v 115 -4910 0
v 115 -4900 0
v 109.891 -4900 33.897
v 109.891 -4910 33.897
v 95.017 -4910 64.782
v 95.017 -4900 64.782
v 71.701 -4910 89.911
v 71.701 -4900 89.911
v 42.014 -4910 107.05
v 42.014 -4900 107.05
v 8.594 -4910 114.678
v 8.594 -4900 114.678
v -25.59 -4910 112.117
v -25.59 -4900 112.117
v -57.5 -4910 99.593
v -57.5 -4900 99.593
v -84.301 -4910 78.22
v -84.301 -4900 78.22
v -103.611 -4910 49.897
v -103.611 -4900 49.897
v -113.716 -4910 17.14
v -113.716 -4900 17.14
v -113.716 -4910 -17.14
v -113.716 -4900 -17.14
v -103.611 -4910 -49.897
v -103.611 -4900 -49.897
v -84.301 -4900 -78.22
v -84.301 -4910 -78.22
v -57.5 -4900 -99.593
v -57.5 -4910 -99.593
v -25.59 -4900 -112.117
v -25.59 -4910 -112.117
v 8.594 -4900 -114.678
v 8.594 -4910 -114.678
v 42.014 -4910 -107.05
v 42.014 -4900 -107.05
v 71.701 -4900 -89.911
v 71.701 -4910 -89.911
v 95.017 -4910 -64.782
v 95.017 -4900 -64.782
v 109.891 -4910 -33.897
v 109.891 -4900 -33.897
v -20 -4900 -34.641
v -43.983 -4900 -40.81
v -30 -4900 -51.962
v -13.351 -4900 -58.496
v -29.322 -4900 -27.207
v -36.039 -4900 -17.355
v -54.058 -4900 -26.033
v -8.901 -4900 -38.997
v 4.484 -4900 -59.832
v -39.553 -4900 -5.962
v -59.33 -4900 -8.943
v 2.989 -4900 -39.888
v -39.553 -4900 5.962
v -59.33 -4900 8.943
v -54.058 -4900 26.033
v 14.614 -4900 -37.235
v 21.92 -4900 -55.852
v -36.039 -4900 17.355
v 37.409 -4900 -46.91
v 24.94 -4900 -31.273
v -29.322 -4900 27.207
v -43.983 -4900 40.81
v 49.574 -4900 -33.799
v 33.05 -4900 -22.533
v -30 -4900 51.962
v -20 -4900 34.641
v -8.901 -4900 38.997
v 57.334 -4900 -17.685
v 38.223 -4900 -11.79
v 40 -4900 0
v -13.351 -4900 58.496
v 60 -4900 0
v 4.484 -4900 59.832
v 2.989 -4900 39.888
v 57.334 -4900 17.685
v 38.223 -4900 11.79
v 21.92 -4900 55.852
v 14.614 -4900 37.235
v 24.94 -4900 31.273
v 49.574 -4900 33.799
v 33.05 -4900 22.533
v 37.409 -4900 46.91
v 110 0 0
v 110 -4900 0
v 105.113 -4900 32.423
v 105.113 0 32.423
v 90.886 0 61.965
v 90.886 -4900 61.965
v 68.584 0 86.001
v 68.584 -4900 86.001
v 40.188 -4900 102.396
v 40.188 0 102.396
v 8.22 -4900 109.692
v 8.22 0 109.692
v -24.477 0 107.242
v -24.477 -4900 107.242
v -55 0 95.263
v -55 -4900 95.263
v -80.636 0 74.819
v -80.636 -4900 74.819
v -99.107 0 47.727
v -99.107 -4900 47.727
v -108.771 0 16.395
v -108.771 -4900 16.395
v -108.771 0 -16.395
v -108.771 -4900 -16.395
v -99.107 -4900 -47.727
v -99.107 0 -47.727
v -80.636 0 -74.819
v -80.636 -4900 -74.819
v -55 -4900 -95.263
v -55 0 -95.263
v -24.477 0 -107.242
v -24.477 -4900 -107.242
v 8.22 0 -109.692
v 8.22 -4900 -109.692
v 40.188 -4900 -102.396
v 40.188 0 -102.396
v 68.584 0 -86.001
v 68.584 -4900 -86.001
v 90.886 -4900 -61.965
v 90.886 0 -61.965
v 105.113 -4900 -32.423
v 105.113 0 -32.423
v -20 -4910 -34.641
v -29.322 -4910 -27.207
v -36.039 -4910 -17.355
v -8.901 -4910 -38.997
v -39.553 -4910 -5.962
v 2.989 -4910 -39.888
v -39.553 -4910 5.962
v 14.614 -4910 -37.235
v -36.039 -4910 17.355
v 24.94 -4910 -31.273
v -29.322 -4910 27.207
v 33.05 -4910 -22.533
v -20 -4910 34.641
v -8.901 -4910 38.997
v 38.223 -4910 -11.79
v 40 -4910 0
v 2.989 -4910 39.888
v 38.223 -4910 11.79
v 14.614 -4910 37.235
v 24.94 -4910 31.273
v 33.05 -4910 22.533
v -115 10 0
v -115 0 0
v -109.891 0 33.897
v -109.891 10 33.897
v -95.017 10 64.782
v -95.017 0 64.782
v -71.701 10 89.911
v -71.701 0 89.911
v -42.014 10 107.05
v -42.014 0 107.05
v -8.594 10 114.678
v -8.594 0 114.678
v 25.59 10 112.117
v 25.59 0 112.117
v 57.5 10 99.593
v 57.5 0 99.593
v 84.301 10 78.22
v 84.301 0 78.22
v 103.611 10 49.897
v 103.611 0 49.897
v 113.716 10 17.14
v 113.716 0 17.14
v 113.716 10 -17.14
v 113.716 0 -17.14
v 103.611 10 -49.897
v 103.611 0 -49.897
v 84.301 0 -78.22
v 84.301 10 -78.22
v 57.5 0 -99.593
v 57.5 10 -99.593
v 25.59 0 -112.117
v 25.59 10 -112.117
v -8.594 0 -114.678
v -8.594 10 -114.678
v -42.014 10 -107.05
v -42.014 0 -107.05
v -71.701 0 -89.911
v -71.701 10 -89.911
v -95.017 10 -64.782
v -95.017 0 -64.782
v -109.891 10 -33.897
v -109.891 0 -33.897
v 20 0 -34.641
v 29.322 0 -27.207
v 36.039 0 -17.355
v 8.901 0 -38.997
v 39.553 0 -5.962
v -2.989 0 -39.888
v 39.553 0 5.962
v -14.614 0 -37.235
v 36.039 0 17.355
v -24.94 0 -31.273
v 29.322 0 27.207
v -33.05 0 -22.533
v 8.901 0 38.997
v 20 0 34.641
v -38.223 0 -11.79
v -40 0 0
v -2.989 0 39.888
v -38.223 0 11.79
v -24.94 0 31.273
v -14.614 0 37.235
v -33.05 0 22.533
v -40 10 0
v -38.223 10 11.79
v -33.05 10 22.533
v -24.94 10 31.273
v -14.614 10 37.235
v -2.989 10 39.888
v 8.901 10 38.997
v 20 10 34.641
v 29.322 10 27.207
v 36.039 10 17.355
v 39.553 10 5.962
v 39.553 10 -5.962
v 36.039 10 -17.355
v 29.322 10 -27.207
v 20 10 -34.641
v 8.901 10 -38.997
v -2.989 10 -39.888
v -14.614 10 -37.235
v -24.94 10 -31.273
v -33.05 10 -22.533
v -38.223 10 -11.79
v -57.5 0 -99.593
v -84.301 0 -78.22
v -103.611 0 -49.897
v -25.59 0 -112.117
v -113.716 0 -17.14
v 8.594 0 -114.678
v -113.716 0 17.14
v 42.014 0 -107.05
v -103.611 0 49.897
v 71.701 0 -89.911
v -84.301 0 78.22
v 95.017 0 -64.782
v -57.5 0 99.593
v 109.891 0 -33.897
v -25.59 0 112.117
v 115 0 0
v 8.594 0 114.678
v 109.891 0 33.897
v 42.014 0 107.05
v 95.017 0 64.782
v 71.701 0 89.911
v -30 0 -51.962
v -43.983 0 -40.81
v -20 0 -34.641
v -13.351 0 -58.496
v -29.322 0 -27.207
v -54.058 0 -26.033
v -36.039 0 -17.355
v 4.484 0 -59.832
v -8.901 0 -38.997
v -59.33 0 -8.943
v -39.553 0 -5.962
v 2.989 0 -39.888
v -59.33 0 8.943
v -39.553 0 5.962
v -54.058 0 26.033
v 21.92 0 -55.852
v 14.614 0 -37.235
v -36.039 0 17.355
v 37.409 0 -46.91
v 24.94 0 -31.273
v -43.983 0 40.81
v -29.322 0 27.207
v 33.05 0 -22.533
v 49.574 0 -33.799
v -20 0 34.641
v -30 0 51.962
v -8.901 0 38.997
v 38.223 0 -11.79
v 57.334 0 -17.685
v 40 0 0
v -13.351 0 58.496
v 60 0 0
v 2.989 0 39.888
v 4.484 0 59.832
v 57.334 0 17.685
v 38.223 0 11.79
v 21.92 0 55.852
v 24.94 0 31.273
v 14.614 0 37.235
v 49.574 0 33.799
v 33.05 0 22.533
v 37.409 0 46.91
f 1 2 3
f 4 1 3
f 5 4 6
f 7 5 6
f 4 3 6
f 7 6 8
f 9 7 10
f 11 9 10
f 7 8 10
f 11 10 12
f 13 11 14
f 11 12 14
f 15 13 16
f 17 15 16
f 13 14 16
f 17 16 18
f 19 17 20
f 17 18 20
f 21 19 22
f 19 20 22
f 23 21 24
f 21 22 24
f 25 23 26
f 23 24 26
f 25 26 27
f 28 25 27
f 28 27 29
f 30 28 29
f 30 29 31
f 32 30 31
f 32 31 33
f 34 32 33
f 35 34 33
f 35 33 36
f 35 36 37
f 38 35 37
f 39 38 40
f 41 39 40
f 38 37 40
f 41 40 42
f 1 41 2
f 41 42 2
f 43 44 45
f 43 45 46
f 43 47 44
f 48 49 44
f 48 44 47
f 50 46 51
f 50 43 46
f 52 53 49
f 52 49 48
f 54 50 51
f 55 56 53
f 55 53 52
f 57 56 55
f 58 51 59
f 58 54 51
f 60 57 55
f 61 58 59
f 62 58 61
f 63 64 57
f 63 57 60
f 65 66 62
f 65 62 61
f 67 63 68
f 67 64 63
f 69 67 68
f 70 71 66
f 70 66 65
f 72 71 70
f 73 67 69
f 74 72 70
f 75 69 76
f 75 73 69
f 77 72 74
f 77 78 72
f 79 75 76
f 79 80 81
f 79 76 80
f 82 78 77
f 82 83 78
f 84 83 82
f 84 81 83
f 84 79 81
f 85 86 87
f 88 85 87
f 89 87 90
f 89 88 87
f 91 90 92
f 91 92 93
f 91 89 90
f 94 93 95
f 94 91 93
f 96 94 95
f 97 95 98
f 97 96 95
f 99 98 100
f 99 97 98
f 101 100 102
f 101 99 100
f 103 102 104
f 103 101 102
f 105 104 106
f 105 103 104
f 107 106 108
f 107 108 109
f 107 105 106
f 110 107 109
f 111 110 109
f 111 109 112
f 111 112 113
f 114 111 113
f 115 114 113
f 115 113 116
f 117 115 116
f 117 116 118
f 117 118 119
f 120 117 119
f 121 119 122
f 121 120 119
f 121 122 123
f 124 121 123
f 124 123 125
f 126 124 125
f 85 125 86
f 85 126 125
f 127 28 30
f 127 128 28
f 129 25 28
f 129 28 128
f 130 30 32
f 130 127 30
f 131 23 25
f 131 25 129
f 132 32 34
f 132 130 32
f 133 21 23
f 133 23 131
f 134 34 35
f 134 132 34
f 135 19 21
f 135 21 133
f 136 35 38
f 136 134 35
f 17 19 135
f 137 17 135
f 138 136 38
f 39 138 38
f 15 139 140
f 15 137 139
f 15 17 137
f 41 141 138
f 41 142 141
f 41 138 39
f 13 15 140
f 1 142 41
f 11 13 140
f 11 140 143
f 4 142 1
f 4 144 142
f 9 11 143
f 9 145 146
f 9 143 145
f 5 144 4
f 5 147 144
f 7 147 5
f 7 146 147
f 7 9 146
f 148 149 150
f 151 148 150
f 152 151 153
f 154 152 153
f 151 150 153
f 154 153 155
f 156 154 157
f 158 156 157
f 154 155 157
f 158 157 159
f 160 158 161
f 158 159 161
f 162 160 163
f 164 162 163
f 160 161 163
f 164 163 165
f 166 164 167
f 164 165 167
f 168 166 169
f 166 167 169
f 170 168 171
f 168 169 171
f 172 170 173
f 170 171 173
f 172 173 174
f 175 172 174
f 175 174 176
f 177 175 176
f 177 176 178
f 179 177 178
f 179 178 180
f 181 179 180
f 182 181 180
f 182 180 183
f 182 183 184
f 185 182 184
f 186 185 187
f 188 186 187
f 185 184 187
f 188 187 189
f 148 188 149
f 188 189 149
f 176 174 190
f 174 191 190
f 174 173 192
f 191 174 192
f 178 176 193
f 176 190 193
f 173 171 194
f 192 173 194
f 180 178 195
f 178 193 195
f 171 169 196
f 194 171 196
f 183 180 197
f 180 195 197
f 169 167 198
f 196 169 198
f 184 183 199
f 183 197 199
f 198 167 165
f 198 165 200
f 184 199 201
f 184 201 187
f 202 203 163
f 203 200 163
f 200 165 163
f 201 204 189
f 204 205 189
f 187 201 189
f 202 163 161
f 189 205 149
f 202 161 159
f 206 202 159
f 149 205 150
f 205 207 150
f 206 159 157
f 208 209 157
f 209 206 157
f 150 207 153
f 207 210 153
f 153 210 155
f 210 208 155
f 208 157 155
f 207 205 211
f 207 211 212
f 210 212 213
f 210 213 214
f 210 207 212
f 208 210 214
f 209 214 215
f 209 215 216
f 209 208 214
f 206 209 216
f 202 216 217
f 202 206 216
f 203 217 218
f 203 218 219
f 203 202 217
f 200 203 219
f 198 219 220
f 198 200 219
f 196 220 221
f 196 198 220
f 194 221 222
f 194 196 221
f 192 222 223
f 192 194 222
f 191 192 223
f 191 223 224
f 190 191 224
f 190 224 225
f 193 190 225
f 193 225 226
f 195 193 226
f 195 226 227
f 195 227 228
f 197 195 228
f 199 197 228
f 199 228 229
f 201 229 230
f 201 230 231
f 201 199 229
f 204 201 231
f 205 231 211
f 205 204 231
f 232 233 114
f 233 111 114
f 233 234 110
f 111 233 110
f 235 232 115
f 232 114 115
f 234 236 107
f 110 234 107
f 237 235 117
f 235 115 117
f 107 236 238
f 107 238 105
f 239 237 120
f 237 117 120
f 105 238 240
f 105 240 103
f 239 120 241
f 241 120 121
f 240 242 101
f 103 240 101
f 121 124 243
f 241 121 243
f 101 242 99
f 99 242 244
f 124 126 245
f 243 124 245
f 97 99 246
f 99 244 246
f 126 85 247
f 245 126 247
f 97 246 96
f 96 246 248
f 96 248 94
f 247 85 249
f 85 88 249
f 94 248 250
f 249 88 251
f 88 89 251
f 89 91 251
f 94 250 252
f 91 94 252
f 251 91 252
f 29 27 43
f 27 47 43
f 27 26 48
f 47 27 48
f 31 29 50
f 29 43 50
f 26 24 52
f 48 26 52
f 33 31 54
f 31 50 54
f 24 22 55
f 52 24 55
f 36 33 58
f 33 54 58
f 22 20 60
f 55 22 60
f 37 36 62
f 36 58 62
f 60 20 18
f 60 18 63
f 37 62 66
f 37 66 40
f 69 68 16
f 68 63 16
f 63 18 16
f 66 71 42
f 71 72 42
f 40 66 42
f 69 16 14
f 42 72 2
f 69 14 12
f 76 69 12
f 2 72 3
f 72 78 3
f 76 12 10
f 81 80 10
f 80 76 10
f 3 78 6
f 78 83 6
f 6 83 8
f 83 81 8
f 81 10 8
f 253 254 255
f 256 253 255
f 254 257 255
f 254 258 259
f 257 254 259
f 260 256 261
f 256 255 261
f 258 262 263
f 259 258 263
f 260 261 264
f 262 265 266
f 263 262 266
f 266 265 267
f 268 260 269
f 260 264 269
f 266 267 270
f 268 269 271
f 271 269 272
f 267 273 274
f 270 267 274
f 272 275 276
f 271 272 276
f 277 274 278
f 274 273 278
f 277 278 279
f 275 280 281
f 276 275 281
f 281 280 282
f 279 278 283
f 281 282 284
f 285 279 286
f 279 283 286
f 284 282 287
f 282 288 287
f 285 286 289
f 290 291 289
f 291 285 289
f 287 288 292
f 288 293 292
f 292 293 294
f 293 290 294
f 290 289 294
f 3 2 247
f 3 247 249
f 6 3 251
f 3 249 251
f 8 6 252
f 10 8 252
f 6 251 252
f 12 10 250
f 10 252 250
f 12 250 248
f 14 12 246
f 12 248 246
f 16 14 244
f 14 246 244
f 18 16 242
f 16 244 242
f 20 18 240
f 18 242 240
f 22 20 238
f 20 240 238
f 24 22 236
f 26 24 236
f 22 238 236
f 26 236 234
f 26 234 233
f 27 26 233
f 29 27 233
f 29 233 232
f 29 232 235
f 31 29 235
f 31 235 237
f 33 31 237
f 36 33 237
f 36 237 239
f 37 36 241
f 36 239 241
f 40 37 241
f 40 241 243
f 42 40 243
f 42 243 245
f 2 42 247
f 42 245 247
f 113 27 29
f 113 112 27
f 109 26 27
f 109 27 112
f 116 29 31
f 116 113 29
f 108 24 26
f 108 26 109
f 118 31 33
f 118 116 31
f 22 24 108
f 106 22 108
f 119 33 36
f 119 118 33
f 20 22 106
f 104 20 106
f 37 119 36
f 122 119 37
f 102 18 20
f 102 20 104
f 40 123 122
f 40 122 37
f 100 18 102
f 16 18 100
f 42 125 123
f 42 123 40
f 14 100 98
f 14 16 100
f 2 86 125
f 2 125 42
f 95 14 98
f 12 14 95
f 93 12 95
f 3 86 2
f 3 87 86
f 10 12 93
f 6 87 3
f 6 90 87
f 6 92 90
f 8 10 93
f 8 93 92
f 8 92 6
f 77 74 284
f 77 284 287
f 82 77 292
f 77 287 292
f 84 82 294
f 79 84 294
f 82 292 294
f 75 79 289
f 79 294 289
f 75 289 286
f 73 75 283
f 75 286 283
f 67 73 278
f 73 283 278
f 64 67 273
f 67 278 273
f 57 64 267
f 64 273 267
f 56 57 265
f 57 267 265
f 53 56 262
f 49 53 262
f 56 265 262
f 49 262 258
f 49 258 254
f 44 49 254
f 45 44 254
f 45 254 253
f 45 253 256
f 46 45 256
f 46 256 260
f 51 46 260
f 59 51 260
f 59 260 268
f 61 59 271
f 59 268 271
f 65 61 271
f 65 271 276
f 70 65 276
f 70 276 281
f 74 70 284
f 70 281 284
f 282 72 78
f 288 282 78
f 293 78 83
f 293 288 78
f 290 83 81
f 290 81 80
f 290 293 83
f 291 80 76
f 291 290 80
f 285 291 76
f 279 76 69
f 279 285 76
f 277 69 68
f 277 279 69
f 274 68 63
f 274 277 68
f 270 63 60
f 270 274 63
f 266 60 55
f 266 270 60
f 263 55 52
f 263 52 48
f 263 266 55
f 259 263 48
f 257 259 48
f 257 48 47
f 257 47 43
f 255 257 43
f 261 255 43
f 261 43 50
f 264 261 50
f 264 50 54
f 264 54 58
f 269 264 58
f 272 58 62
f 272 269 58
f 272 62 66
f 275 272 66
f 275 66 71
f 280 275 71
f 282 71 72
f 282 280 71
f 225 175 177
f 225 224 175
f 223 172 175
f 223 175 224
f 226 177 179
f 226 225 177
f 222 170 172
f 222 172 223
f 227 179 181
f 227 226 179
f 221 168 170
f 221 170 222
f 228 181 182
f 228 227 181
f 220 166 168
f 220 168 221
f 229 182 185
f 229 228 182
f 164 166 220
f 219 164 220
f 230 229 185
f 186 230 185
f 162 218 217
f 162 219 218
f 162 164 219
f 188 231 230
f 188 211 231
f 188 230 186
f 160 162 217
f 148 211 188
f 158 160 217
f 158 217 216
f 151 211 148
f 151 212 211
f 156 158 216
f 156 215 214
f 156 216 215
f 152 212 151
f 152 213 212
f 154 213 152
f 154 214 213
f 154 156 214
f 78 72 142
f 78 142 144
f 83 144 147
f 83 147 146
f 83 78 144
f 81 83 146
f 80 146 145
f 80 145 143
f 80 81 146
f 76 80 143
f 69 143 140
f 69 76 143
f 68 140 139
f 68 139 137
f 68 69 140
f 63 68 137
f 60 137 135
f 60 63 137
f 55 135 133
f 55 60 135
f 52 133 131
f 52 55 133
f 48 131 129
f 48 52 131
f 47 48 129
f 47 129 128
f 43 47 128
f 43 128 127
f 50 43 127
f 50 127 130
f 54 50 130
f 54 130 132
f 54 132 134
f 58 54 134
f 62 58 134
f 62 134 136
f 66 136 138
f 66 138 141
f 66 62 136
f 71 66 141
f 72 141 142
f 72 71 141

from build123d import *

# Parameters (mm, degrees)
F0_R     = 60
F0_R_2   = 40
F1_DEPTH = 4900
F0_R_3   = 115
F0_R_4   = 110
F2_R     = 115
F2_R_2   = 40
F3_DEPTH = 10
F4_R     = 115
F4_R_2   = 40
F5_DEPTH = 10


with BuildPart() as f1:
    # F0 (on Front) → F1 (new body)
    with BuildSketch(Plane.XZ):
        Circle(F0_R)
        Circle(F0_R_2, mode=Mode.SUBTRACT)
    extrude(amount=F1_DEPTH)


with BuildPart() as f1b:
    # F0 (on Front) → F1, piece 2 (new body)
    with BuildSketch(Plane.XZ):
        Circle(F0_R_3)
        Circle(F0_R_4, mode=Mode.SUBTRACT)
    extrude(amount=F1_DEPTH)


with BuildPart() as f3:
    # F2 (on face) → F3 (new body)
    with BuildSketch(Plane.XZ.offset(4900)):
        Circle(F2_R)
        Circle(F2_R_2, mode=Mode.SUBTRACT)
    extrude(amount=F3_DEPTH)


with BuildPart() as f5:
    # F4 (on face) → F5 (new body)
    with BuildSketch(Plane(origin=(0, 0, 0), x_dir=(-1, 0, 0), z_dir=(0, 1, 0))):
        Circle(F4_R)
        Circle(F4_R_2, mode=Mode.SUBTRACT)
    extrude(amount=F5_DEPTH)


solid = Compound([f1.part, f1b.part, f3.part, f5.part])
